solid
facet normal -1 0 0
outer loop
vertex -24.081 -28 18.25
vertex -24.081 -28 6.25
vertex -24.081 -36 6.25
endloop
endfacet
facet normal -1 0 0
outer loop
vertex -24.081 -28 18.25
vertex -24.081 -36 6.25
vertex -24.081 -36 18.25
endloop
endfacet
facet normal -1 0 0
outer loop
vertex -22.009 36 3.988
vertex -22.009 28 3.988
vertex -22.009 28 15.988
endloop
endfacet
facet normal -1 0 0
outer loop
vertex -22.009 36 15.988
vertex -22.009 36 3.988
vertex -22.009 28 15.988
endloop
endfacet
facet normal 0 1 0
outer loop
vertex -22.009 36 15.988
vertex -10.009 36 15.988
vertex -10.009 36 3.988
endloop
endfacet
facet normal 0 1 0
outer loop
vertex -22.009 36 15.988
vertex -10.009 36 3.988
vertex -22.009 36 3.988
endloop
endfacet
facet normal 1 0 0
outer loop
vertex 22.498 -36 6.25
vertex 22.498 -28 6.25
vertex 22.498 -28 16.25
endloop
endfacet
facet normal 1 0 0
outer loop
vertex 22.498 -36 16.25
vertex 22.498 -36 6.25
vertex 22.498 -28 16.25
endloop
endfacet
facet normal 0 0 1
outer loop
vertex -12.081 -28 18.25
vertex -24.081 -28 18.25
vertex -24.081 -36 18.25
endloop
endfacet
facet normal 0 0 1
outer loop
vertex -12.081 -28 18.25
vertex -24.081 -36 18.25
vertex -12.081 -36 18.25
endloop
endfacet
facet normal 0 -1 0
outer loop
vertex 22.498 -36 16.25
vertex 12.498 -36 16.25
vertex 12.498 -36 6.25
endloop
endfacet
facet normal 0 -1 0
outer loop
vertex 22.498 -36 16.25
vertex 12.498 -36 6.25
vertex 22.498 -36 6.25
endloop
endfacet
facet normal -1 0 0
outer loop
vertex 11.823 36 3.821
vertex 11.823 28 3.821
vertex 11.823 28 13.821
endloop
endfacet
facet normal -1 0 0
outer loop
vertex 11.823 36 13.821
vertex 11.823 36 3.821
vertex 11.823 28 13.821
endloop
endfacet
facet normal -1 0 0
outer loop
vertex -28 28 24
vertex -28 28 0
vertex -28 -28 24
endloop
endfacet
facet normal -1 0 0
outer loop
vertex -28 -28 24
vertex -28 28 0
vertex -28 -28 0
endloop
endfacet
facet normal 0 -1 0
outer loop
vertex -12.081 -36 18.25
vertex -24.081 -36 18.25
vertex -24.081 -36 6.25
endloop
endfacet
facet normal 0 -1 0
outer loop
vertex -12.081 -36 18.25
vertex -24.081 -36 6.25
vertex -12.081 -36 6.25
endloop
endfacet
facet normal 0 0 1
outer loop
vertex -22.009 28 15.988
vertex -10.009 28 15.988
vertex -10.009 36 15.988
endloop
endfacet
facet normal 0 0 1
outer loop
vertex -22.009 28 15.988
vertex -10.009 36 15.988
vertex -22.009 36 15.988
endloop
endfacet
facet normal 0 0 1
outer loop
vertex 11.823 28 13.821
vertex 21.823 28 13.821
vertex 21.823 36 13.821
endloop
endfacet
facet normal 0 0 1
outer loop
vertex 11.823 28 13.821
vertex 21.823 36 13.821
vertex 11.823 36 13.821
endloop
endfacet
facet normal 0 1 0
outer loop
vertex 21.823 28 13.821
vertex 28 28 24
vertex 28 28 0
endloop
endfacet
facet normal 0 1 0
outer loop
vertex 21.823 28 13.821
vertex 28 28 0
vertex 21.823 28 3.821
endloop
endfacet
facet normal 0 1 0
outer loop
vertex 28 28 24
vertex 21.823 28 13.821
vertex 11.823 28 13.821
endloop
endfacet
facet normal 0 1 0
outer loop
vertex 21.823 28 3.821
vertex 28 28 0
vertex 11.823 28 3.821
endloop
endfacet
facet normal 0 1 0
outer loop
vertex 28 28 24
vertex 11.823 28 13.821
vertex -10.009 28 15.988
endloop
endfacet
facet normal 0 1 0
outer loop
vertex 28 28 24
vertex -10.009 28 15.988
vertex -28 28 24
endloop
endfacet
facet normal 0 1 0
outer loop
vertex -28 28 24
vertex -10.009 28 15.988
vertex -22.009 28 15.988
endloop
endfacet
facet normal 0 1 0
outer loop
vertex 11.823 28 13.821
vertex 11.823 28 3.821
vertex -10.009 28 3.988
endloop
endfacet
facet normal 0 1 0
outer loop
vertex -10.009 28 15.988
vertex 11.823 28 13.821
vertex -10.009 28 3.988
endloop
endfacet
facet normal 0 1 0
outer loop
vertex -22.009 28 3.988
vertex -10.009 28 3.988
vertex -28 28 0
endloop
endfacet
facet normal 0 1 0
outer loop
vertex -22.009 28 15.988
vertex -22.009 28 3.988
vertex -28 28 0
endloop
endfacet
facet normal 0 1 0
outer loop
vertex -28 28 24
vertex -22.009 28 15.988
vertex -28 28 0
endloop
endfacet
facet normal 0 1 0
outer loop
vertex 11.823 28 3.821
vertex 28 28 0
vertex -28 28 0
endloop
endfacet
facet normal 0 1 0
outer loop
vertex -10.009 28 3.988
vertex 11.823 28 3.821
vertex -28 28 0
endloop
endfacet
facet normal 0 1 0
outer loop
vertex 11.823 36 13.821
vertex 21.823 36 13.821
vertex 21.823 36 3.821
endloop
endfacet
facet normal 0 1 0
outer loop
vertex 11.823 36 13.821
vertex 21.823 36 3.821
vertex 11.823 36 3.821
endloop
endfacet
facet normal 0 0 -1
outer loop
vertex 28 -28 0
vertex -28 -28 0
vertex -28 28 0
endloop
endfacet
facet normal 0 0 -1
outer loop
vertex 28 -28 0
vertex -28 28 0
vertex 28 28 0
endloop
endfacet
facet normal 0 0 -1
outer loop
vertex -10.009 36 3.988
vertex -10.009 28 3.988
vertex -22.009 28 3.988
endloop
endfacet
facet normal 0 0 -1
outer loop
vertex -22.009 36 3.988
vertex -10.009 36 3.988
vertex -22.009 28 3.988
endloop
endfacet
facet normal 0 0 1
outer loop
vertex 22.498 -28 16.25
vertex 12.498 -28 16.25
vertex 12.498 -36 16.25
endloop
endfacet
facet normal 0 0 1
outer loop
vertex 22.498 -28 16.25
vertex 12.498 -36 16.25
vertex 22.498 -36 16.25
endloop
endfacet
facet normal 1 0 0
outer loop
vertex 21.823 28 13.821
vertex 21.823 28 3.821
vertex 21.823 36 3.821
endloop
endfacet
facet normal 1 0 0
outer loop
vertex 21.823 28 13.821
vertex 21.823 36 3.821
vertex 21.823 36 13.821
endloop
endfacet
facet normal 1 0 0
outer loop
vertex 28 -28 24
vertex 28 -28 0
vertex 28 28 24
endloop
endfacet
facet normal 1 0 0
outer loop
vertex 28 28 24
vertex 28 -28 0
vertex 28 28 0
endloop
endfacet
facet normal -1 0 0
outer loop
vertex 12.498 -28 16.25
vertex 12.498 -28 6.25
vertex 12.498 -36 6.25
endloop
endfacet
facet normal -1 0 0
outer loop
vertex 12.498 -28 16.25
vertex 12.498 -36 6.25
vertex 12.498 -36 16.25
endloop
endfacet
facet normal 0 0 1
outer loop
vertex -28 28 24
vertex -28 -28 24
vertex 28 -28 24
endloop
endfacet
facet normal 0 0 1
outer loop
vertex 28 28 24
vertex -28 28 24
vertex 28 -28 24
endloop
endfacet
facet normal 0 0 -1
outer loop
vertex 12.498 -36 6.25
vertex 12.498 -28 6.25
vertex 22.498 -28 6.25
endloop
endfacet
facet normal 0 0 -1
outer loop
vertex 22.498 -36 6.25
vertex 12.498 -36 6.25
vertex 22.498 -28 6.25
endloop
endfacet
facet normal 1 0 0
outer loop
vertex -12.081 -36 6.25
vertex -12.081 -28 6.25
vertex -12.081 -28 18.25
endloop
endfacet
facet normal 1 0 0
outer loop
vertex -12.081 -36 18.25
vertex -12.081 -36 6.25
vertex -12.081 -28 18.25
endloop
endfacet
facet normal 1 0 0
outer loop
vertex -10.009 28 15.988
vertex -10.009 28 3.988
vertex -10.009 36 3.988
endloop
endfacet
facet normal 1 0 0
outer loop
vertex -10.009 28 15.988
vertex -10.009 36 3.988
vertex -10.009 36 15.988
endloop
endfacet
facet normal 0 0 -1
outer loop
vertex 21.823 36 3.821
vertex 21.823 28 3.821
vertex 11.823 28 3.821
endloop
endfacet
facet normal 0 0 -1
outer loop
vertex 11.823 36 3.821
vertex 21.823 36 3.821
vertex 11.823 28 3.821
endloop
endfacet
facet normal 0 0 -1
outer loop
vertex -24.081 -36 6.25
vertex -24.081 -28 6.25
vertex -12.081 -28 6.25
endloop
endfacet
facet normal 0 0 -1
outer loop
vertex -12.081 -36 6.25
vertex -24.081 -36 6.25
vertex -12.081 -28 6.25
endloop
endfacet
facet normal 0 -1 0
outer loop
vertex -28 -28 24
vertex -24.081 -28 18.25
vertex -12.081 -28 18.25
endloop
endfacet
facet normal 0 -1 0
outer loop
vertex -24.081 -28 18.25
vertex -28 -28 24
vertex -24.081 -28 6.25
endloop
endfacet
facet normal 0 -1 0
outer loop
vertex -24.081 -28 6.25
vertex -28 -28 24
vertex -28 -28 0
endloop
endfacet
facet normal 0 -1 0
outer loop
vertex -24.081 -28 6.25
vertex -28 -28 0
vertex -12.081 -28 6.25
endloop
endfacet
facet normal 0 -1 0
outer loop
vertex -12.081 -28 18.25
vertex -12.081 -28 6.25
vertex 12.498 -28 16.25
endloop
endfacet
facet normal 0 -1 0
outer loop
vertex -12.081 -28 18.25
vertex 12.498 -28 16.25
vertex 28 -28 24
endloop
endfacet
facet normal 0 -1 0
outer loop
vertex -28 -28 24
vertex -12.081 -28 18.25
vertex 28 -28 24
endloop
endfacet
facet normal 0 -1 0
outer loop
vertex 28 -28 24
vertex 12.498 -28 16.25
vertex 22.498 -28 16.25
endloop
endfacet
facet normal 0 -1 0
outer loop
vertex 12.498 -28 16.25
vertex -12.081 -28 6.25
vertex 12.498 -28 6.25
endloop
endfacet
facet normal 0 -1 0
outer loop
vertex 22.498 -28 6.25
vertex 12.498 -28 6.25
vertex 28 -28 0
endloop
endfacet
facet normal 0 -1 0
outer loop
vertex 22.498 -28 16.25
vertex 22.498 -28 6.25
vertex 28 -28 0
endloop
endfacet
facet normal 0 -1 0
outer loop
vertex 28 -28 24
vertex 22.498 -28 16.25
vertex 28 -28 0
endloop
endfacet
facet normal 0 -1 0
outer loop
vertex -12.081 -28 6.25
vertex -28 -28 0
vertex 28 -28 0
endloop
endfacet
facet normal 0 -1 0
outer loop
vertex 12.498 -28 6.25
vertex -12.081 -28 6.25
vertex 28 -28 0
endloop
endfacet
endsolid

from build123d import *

# Parameters (mm, degrees)
F0_W     = 28
F0_H     = 28
F1_DEPTH = 24
F2_W     = 10
F2_H     = 10
F2_W_2   = 12
F2_H_2   = 12
F3_DEPTH = 8
F4_W     = 12
F4_H     = 12
F4_W_2   = 10
F4_H_2   = 10
F5_DEPTH = 8


with BuildPart() as f1:
    # F0 (on Top) → F1 (new body)
    with BuildSketch(Plane.XY):
        with Locations((-14, -14)):
            Rectangle(F0_W, F0_H)
        with Locations((14, -14)):
            Rectangle(F0_W, F0_H)
        with Locations((14, 14)):
            Rectangle(F0_W, F0_H)
        with Locations((-14, 14)):
            Rectangle(F0_W, F0_H)
    extrude(amount=F1_DEPTH)

    # F2 (on face) → F3 (join)
    with BuildSketch(Plane(origin=(0, 28, 0), x_dir=(-1, 0, 0), z_dir=(0, 1, 0))):
        with Locations((-16.822546, 8.821471)):
            Rectangle(F2_W, F2_H)
        with Locations((16.008998, 9.988178)):
            Rectangle(F2_W_2, F2_H_2)
    extrude(amount=F3_DEPTH)

    # F4 (on face) → F5 (join)
    with BuildSketch(Plane.XZ.offset(28)):
        with Locations((-18.081427, 12.249541)):
            Rectangle(F4_W, F4_H)
        with Locations((17.498491, 11.249541)):
            Rectangle(F4_W_2, F4_H_2)
    extrude(amount=F5_DEPTH)


solid = f1.part
